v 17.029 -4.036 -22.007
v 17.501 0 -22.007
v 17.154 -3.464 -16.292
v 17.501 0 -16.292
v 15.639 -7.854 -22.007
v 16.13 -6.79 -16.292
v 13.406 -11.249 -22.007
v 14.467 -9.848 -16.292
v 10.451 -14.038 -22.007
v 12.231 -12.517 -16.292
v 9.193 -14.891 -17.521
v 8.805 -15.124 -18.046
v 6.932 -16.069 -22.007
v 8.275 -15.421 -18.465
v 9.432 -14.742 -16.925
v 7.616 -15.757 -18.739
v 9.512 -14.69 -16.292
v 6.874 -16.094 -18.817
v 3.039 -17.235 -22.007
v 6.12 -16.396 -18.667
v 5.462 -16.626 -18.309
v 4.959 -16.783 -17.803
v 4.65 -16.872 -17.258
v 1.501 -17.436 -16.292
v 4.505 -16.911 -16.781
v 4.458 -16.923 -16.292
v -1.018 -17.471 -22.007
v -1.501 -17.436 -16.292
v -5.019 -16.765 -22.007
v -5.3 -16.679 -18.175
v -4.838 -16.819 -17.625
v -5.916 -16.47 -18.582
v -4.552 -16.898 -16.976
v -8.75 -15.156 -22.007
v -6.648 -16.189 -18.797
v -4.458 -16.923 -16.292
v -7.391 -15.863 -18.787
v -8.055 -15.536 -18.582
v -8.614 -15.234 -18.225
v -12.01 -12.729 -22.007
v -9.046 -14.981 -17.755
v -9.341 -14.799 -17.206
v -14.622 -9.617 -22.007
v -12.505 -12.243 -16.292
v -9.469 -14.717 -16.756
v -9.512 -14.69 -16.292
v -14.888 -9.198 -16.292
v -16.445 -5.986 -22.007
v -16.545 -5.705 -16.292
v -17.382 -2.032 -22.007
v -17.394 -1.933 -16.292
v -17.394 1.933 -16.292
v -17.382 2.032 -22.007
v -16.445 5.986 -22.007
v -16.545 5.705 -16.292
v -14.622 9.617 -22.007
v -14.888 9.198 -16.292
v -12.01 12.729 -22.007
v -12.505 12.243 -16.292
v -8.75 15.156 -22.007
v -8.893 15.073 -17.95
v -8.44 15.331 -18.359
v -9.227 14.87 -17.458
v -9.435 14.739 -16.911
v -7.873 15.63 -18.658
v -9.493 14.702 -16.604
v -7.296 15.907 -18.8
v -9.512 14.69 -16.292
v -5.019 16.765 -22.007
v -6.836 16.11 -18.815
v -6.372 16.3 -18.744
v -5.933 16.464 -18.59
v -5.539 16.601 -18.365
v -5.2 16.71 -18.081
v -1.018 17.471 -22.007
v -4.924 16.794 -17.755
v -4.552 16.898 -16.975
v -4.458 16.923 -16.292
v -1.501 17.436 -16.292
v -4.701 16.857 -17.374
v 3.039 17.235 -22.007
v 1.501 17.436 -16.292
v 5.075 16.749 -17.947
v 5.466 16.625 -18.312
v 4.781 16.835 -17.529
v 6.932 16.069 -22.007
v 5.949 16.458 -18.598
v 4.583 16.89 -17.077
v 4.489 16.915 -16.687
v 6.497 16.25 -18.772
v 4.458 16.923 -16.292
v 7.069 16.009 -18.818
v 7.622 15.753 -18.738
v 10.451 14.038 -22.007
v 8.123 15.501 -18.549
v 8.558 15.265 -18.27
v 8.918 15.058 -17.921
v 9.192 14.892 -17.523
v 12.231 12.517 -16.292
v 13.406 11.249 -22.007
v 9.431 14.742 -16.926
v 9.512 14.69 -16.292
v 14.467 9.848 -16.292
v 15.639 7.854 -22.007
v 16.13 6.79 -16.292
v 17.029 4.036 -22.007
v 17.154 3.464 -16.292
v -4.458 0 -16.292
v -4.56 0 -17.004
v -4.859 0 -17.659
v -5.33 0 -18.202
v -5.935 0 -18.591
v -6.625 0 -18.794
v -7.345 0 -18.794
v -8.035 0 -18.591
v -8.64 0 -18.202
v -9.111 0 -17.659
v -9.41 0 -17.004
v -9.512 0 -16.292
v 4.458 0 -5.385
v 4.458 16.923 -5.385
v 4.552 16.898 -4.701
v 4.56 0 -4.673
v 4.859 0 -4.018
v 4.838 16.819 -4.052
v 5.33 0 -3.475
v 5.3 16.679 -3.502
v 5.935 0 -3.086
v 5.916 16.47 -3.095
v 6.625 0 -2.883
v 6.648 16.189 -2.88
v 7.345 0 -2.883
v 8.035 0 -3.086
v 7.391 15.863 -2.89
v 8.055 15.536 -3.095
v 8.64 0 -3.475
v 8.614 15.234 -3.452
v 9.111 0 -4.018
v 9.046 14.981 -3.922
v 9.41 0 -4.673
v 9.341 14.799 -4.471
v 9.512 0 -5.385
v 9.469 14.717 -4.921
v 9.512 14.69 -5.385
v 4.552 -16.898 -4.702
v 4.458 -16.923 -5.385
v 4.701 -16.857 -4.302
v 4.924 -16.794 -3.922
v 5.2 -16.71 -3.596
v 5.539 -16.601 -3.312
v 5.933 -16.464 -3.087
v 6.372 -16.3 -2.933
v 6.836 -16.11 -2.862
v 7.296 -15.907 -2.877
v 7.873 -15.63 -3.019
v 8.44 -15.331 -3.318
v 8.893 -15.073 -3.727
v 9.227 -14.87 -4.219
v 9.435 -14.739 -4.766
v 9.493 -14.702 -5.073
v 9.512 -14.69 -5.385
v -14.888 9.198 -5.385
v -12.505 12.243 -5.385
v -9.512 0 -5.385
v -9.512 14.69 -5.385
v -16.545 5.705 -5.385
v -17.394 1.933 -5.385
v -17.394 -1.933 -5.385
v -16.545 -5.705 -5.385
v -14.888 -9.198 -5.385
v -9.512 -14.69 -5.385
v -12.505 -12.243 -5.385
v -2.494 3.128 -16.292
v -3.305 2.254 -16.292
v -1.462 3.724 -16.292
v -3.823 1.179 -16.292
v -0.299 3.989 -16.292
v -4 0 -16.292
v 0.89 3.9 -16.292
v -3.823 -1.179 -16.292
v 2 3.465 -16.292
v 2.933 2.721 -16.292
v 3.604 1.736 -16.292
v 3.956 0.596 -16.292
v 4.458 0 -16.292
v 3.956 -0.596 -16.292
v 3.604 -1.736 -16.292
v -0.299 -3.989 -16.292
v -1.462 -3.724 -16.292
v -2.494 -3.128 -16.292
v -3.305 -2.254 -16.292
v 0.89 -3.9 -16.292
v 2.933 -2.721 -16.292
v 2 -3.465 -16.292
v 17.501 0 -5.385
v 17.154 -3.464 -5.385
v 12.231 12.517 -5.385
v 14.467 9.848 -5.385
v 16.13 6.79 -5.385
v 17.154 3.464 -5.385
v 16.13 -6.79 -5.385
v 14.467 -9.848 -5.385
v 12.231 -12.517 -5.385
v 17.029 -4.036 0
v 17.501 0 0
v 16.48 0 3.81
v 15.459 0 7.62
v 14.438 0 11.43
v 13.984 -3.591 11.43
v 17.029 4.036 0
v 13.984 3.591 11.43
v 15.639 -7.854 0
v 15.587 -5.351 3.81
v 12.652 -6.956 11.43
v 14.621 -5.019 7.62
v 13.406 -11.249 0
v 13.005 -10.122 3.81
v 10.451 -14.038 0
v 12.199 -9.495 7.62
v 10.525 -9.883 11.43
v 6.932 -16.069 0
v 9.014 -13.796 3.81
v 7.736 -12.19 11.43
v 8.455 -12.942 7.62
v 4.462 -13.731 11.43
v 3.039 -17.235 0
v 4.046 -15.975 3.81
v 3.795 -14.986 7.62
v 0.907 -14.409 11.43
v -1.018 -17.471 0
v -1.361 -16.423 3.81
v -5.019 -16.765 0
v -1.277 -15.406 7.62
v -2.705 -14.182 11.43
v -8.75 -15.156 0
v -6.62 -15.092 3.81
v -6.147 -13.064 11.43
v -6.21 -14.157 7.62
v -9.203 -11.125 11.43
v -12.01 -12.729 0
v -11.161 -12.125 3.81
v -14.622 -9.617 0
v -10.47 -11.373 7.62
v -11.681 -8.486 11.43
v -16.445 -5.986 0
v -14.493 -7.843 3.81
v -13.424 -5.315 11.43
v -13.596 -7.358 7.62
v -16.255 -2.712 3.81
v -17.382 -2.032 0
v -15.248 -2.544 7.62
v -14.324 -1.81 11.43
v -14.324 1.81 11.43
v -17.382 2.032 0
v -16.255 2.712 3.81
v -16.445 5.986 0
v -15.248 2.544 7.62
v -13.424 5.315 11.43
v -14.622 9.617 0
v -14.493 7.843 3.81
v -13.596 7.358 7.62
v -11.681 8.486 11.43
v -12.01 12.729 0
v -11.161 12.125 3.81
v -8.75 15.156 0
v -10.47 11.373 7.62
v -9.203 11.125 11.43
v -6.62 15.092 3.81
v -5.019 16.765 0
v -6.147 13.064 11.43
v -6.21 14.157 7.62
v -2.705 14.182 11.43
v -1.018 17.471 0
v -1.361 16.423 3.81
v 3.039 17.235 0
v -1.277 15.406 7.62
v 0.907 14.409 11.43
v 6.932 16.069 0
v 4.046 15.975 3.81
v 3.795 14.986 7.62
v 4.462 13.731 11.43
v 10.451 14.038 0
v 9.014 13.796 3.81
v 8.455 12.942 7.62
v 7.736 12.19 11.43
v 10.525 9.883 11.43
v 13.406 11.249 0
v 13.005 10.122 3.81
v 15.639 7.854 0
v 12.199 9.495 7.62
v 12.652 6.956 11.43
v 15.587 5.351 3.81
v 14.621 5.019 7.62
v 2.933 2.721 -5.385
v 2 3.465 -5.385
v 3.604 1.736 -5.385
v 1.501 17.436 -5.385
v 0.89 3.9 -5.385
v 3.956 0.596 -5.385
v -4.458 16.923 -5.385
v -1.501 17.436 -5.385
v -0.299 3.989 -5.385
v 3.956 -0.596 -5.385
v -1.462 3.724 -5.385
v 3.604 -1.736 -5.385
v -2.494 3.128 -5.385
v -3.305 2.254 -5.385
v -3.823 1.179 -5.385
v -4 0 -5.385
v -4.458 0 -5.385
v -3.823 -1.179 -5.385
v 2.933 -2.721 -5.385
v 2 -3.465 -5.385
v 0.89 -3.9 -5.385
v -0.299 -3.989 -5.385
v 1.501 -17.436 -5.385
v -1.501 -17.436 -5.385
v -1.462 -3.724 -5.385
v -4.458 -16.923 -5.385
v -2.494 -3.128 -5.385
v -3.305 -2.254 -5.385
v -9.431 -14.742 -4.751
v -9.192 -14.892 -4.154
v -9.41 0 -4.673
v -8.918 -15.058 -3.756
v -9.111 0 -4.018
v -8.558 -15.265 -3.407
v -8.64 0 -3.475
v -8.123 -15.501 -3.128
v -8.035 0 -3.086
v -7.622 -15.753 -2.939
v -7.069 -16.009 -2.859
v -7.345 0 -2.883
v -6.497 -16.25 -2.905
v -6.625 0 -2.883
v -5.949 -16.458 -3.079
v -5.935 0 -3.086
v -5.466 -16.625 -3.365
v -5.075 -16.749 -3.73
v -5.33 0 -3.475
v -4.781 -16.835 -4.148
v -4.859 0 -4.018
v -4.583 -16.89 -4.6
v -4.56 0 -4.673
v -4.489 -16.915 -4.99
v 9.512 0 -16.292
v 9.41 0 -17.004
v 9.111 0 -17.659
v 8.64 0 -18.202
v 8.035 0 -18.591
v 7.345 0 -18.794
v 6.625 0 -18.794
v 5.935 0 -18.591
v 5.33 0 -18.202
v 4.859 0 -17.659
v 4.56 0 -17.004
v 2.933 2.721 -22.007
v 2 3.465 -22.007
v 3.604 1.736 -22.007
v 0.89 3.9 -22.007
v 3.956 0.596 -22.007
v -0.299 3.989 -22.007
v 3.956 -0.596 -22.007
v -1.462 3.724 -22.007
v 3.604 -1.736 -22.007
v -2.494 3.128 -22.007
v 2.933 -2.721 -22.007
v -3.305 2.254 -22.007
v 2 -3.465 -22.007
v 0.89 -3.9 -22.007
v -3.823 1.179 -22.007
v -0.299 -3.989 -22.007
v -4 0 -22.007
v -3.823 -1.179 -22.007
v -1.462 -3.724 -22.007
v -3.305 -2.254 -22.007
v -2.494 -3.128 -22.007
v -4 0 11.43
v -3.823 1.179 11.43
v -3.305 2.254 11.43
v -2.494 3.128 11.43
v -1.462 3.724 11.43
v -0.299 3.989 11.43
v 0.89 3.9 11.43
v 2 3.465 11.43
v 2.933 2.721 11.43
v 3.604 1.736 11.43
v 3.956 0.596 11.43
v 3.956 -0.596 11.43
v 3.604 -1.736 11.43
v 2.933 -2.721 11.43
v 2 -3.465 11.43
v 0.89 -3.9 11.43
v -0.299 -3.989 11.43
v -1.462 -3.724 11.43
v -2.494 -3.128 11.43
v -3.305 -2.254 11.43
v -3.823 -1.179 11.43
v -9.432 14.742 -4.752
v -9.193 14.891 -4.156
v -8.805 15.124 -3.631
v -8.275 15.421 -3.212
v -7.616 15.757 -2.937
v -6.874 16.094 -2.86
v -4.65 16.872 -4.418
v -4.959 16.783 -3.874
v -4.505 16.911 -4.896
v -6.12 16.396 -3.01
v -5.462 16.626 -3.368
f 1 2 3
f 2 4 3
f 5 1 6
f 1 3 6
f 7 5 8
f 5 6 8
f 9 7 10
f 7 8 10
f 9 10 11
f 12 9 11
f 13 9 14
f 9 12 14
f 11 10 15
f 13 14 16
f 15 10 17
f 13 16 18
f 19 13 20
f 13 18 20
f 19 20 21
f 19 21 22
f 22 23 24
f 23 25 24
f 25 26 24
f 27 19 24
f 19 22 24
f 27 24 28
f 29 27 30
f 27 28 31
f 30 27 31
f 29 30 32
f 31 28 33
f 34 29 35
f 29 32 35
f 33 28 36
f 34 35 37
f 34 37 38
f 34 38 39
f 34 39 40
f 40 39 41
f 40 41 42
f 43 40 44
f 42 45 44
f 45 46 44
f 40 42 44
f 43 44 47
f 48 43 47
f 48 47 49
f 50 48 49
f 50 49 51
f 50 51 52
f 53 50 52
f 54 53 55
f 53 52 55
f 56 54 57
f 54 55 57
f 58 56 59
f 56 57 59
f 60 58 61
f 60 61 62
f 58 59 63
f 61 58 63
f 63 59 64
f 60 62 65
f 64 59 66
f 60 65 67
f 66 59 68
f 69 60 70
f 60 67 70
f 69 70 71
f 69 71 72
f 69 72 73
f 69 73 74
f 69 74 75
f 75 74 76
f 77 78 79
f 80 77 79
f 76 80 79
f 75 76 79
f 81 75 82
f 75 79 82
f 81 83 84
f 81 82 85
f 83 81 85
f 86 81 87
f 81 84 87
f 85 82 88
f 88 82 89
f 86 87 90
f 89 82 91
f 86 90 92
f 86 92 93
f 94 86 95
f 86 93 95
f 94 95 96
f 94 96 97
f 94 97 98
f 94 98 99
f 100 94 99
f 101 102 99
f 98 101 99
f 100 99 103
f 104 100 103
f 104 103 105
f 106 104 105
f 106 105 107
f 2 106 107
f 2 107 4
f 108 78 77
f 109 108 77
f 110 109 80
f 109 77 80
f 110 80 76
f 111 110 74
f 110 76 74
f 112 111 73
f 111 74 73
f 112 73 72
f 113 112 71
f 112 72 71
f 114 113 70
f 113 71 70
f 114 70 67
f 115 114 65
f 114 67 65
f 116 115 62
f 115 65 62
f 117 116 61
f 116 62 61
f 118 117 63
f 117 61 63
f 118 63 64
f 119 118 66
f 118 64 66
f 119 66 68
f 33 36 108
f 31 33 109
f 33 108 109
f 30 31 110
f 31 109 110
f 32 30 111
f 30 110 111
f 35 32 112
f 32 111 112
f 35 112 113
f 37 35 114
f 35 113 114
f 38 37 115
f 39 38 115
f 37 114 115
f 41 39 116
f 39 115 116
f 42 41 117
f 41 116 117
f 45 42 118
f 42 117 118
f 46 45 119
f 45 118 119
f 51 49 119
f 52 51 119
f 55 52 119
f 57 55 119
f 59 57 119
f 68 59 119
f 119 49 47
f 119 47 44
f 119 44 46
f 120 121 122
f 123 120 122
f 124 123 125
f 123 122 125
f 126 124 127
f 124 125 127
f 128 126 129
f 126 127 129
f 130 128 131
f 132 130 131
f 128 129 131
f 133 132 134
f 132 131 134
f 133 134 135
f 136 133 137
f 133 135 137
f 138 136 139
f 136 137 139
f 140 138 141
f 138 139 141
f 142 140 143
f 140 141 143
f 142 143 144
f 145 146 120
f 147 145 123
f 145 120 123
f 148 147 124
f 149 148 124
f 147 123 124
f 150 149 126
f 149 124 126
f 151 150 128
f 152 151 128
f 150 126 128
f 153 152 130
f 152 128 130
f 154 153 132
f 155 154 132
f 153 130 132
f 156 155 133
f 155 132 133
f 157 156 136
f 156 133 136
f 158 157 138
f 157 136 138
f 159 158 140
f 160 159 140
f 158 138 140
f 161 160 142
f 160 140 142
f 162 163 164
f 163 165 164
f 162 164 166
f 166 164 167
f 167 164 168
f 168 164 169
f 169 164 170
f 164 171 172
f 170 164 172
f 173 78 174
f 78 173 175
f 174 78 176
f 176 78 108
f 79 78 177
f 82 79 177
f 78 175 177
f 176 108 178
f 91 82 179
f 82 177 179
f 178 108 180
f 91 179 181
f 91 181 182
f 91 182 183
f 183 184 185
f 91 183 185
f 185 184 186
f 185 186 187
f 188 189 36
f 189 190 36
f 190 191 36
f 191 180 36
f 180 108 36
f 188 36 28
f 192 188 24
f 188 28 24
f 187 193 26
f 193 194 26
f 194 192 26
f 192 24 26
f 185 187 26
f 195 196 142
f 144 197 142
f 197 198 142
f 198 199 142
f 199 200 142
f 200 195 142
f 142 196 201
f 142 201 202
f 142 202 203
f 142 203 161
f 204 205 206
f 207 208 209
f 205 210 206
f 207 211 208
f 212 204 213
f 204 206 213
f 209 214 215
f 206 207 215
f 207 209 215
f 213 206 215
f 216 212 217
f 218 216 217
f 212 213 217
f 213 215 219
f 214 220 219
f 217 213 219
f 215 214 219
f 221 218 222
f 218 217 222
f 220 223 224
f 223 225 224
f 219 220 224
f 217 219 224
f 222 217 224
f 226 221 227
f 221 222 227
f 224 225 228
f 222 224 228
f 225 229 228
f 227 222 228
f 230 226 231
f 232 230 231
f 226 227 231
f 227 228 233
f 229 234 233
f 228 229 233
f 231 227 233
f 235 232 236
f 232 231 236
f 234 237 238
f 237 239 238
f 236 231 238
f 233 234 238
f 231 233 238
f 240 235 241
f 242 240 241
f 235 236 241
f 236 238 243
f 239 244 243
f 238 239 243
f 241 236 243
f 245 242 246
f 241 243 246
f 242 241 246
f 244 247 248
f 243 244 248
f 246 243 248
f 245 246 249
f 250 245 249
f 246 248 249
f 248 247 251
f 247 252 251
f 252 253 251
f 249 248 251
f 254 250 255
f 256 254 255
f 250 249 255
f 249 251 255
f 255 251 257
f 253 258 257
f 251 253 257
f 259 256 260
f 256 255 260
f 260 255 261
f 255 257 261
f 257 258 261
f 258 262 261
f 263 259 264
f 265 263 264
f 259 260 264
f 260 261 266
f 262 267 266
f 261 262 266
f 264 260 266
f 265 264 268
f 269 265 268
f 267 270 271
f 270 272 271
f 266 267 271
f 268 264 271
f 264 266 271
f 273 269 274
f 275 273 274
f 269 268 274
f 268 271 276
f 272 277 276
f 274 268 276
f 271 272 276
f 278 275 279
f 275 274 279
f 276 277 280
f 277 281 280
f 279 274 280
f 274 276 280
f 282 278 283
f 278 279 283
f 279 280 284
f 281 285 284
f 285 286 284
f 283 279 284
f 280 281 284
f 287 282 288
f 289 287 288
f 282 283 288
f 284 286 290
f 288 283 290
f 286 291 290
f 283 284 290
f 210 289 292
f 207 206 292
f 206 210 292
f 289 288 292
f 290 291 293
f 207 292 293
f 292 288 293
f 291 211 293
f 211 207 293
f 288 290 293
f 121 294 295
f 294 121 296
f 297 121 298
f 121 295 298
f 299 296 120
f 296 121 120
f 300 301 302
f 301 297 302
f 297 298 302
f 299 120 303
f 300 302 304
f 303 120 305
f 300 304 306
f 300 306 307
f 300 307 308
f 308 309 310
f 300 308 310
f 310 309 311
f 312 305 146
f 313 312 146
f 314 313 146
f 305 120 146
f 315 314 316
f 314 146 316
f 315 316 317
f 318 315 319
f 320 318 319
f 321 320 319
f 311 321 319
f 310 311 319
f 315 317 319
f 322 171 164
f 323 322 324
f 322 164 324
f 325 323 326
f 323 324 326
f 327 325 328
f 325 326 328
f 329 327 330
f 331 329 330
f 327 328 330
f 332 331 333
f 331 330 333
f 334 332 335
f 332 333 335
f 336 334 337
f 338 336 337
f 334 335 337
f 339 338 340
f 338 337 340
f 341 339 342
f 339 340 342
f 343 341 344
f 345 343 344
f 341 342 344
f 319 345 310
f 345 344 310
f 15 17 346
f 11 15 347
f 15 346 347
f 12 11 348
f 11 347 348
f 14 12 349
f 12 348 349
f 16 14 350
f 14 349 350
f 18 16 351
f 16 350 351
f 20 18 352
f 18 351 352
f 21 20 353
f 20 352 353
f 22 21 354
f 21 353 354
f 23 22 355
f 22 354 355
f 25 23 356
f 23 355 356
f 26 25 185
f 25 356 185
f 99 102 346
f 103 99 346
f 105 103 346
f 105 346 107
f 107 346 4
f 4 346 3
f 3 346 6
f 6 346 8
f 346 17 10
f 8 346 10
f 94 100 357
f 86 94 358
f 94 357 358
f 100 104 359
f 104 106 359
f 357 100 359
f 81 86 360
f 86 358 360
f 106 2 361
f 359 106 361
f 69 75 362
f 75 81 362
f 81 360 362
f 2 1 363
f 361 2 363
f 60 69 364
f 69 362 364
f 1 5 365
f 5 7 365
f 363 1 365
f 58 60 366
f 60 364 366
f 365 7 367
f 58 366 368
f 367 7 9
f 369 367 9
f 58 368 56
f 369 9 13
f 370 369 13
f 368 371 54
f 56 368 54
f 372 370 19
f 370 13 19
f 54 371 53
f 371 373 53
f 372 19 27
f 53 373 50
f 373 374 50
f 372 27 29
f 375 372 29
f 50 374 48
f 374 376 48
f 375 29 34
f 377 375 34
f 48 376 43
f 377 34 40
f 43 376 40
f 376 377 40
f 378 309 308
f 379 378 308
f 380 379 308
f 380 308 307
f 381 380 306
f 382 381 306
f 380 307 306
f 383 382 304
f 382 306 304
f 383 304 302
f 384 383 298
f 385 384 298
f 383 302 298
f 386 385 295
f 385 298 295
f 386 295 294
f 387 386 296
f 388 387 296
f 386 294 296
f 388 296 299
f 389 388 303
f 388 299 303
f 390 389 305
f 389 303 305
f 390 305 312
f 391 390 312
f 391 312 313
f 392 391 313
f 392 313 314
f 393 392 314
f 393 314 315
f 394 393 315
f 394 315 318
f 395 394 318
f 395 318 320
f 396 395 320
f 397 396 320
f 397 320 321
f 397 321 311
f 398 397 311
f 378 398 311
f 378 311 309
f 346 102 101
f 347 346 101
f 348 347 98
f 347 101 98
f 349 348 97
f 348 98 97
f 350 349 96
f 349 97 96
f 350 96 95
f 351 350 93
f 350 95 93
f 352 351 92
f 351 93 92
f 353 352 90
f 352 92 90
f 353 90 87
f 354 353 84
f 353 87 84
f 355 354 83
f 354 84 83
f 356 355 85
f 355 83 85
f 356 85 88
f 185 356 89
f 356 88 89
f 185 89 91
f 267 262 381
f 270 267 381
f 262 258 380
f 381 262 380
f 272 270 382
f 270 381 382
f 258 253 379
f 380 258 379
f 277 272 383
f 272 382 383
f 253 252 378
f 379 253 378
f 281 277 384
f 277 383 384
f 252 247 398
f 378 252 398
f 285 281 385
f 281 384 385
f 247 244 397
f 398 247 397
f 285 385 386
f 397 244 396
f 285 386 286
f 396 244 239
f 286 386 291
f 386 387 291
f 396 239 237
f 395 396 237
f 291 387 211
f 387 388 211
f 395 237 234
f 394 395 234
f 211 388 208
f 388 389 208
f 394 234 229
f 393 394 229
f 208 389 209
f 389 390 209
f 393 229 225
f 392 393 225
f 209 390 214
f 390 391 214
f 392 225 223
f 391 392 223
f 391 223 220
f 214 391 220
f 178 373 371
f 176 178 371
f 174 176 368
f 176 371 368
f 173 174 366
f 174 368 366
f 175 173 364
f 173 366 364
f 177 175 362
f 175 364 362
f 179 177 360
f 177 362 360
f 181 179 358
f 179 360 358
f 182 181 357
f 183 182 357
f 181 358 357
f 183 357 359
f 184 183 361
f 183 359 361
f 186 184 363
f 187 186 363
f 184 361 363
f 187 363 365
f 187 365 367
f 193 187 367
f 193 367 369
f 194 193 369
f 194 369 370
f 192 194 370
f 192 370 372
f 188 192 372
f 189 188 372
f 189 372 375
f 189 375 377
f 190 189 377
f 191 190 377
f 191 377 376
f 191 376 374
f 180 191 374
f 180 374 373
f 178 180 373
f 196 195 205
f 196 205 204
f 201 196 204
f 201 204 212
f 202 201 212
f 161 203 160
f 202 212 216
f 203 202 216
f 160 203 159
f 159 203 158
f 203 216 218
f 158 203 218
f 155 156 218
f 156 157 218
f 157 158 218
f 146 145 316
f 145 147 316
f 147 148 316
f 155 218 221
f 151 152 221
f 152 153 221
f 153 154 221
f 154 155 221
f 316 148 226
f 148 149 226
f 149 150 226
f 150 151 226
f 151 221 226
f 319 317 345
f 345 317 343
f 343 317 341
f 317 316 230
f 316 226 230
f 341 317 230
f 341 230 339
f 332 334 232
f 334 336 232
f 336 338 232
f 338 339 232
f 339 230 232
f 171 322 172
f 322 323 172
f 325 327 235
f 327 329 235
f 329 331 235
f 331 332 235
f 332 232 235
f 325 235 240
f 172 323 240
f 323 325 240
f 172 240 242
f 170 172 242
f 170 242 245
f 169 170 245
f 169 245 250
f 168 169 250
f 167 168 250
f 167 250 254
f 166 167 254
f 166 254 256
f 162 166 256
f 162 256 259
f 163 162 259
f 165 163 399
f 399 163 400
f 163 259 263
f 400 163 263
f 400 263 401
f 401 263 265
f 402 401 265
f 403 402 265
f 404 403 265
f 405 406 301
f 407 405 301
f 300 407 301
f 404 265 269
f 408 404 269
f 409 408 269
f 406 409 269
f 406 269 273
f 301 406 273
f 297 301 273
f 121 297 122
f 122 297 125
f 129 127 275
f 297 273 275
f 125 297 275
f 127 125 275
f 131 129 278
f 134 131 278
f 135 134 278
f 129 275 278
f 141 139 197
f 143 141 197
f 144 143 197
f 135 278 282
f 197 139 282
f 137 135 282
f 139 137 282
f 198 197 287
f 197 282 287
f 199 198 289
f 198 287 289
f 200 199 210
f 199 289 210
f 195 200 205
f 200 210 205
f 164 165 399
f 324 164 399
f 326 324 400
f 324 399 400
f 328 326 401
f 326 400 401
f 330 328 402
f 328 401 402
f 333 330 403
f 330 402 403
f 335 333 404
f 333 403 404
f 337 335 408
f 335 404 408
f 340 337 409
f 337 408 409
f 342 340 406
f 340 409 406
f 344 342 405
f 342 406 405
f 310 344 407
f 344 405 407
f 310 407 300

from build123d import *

# Parameters (mm, degrees)
F0_W       = 10.5156
F0_H       = 5.3848
F0_W_2     = 6.985
F0_H_2     = 5.715
F2_D       = 5.0546
F2_DEPTH   = 17.5016
F2_2_D     = 5.0546
F2_2_DEPTH = 17.5016
F3_D       = 5.0546
F3_2_D     = 5.0546
F5_D       = 8.001
F5_2_D     = 8.001


with BuildPart() as f1:
    # F0 (on Front) → F1 (revolve)
    with BuildSketch(Plane.XZ):
        Polygon((0, 11.43), (0, 0), (6.985, 0), (17.5006, 0), (14.4379407305, 11.43), align=None)
        with Locations((12.2428, -2.6924)):
            Rectangle(F0_W, F0_H)
        with Locations((3.4925, -2.6924)):
            Rectangle(F0_W_2, F0_H)
    revolve(axis=Axis((0, 0, 5.715), (0, 0, -1)))

    # F2 (through all, one way)
    with BuildSketch(Plane(origin=(0, 0, 0), x_dir=(1, 0, 0), z_dir=(0, 1, 0))):
        with Locations((6.985, 5.3848), (-6.985, 5.3848), (6.985, 16.2921505755), (-6.985, 16.2921505755)):
            Circle(F2_D / 2)
    extrude(amount=-F2_DEPTH, mode=Mode.SUBTRACT)

    # F3 (through all)
    with Locations(Plane.XZ):
        with Locations((-6.985, -5.3848), (6.985, -5.3848), (6.985, -16.2921505755), (-6.985, -16.2921505755)):
            Hole(F3_D / 2)

    # F5 (through all)
    with Locations(Plane.XY.offset(11.43)):
        with Locations((0, 0)):
            Hole(F5_D / 2)


with BuildPart() as f1b:
    # F0 (on Front) → F1, piece 2 (revolve)
    with BuildSketch(Plane.XZ):
        with Locations((3.4925, -19.1496505755)):
            Rectangle(F0_W_2, F0_H_2)
        with Locations((12.2428, -19.1496505755)):
            Rectangle(F0_W, F0_H_2)
    revolve(axis=Axis((0, 0, 5.715), (0, 0, -1)))

    # F2#2 (through all, one way)
    with BuildSketch(Plane(origin=(0, 0, 0), x_dir=(1, 0, 0), z_dir=(0, 1, 0))):
        with Locations((6.985, 5.3848), (-6.985, 5.3848), (6.985, 16.2921505755), (-6.985, 16.2921505755)):
            Circle(F2_2_D / 2)
    extrude(amount=-F2_2_DEPTH, mode=Mode.SUBTRACT)

    # F3#2 (through all)
    with Locations(Plane.XZ):
        with Locations((-6.985, -5.3848), (6.985, -5.3848), (6.985, -16.2921505755), (-6.985, -16.2921505755)):
            Hole(F3_2_D / 2)

    # F5#2 (through all)
    with Locations(Plane.XY.offset(11.43)):
        with Locations((0, 0)):
            Hole(F5_2_D / 2)


solid = Compound([f1.part, f1b.part])
